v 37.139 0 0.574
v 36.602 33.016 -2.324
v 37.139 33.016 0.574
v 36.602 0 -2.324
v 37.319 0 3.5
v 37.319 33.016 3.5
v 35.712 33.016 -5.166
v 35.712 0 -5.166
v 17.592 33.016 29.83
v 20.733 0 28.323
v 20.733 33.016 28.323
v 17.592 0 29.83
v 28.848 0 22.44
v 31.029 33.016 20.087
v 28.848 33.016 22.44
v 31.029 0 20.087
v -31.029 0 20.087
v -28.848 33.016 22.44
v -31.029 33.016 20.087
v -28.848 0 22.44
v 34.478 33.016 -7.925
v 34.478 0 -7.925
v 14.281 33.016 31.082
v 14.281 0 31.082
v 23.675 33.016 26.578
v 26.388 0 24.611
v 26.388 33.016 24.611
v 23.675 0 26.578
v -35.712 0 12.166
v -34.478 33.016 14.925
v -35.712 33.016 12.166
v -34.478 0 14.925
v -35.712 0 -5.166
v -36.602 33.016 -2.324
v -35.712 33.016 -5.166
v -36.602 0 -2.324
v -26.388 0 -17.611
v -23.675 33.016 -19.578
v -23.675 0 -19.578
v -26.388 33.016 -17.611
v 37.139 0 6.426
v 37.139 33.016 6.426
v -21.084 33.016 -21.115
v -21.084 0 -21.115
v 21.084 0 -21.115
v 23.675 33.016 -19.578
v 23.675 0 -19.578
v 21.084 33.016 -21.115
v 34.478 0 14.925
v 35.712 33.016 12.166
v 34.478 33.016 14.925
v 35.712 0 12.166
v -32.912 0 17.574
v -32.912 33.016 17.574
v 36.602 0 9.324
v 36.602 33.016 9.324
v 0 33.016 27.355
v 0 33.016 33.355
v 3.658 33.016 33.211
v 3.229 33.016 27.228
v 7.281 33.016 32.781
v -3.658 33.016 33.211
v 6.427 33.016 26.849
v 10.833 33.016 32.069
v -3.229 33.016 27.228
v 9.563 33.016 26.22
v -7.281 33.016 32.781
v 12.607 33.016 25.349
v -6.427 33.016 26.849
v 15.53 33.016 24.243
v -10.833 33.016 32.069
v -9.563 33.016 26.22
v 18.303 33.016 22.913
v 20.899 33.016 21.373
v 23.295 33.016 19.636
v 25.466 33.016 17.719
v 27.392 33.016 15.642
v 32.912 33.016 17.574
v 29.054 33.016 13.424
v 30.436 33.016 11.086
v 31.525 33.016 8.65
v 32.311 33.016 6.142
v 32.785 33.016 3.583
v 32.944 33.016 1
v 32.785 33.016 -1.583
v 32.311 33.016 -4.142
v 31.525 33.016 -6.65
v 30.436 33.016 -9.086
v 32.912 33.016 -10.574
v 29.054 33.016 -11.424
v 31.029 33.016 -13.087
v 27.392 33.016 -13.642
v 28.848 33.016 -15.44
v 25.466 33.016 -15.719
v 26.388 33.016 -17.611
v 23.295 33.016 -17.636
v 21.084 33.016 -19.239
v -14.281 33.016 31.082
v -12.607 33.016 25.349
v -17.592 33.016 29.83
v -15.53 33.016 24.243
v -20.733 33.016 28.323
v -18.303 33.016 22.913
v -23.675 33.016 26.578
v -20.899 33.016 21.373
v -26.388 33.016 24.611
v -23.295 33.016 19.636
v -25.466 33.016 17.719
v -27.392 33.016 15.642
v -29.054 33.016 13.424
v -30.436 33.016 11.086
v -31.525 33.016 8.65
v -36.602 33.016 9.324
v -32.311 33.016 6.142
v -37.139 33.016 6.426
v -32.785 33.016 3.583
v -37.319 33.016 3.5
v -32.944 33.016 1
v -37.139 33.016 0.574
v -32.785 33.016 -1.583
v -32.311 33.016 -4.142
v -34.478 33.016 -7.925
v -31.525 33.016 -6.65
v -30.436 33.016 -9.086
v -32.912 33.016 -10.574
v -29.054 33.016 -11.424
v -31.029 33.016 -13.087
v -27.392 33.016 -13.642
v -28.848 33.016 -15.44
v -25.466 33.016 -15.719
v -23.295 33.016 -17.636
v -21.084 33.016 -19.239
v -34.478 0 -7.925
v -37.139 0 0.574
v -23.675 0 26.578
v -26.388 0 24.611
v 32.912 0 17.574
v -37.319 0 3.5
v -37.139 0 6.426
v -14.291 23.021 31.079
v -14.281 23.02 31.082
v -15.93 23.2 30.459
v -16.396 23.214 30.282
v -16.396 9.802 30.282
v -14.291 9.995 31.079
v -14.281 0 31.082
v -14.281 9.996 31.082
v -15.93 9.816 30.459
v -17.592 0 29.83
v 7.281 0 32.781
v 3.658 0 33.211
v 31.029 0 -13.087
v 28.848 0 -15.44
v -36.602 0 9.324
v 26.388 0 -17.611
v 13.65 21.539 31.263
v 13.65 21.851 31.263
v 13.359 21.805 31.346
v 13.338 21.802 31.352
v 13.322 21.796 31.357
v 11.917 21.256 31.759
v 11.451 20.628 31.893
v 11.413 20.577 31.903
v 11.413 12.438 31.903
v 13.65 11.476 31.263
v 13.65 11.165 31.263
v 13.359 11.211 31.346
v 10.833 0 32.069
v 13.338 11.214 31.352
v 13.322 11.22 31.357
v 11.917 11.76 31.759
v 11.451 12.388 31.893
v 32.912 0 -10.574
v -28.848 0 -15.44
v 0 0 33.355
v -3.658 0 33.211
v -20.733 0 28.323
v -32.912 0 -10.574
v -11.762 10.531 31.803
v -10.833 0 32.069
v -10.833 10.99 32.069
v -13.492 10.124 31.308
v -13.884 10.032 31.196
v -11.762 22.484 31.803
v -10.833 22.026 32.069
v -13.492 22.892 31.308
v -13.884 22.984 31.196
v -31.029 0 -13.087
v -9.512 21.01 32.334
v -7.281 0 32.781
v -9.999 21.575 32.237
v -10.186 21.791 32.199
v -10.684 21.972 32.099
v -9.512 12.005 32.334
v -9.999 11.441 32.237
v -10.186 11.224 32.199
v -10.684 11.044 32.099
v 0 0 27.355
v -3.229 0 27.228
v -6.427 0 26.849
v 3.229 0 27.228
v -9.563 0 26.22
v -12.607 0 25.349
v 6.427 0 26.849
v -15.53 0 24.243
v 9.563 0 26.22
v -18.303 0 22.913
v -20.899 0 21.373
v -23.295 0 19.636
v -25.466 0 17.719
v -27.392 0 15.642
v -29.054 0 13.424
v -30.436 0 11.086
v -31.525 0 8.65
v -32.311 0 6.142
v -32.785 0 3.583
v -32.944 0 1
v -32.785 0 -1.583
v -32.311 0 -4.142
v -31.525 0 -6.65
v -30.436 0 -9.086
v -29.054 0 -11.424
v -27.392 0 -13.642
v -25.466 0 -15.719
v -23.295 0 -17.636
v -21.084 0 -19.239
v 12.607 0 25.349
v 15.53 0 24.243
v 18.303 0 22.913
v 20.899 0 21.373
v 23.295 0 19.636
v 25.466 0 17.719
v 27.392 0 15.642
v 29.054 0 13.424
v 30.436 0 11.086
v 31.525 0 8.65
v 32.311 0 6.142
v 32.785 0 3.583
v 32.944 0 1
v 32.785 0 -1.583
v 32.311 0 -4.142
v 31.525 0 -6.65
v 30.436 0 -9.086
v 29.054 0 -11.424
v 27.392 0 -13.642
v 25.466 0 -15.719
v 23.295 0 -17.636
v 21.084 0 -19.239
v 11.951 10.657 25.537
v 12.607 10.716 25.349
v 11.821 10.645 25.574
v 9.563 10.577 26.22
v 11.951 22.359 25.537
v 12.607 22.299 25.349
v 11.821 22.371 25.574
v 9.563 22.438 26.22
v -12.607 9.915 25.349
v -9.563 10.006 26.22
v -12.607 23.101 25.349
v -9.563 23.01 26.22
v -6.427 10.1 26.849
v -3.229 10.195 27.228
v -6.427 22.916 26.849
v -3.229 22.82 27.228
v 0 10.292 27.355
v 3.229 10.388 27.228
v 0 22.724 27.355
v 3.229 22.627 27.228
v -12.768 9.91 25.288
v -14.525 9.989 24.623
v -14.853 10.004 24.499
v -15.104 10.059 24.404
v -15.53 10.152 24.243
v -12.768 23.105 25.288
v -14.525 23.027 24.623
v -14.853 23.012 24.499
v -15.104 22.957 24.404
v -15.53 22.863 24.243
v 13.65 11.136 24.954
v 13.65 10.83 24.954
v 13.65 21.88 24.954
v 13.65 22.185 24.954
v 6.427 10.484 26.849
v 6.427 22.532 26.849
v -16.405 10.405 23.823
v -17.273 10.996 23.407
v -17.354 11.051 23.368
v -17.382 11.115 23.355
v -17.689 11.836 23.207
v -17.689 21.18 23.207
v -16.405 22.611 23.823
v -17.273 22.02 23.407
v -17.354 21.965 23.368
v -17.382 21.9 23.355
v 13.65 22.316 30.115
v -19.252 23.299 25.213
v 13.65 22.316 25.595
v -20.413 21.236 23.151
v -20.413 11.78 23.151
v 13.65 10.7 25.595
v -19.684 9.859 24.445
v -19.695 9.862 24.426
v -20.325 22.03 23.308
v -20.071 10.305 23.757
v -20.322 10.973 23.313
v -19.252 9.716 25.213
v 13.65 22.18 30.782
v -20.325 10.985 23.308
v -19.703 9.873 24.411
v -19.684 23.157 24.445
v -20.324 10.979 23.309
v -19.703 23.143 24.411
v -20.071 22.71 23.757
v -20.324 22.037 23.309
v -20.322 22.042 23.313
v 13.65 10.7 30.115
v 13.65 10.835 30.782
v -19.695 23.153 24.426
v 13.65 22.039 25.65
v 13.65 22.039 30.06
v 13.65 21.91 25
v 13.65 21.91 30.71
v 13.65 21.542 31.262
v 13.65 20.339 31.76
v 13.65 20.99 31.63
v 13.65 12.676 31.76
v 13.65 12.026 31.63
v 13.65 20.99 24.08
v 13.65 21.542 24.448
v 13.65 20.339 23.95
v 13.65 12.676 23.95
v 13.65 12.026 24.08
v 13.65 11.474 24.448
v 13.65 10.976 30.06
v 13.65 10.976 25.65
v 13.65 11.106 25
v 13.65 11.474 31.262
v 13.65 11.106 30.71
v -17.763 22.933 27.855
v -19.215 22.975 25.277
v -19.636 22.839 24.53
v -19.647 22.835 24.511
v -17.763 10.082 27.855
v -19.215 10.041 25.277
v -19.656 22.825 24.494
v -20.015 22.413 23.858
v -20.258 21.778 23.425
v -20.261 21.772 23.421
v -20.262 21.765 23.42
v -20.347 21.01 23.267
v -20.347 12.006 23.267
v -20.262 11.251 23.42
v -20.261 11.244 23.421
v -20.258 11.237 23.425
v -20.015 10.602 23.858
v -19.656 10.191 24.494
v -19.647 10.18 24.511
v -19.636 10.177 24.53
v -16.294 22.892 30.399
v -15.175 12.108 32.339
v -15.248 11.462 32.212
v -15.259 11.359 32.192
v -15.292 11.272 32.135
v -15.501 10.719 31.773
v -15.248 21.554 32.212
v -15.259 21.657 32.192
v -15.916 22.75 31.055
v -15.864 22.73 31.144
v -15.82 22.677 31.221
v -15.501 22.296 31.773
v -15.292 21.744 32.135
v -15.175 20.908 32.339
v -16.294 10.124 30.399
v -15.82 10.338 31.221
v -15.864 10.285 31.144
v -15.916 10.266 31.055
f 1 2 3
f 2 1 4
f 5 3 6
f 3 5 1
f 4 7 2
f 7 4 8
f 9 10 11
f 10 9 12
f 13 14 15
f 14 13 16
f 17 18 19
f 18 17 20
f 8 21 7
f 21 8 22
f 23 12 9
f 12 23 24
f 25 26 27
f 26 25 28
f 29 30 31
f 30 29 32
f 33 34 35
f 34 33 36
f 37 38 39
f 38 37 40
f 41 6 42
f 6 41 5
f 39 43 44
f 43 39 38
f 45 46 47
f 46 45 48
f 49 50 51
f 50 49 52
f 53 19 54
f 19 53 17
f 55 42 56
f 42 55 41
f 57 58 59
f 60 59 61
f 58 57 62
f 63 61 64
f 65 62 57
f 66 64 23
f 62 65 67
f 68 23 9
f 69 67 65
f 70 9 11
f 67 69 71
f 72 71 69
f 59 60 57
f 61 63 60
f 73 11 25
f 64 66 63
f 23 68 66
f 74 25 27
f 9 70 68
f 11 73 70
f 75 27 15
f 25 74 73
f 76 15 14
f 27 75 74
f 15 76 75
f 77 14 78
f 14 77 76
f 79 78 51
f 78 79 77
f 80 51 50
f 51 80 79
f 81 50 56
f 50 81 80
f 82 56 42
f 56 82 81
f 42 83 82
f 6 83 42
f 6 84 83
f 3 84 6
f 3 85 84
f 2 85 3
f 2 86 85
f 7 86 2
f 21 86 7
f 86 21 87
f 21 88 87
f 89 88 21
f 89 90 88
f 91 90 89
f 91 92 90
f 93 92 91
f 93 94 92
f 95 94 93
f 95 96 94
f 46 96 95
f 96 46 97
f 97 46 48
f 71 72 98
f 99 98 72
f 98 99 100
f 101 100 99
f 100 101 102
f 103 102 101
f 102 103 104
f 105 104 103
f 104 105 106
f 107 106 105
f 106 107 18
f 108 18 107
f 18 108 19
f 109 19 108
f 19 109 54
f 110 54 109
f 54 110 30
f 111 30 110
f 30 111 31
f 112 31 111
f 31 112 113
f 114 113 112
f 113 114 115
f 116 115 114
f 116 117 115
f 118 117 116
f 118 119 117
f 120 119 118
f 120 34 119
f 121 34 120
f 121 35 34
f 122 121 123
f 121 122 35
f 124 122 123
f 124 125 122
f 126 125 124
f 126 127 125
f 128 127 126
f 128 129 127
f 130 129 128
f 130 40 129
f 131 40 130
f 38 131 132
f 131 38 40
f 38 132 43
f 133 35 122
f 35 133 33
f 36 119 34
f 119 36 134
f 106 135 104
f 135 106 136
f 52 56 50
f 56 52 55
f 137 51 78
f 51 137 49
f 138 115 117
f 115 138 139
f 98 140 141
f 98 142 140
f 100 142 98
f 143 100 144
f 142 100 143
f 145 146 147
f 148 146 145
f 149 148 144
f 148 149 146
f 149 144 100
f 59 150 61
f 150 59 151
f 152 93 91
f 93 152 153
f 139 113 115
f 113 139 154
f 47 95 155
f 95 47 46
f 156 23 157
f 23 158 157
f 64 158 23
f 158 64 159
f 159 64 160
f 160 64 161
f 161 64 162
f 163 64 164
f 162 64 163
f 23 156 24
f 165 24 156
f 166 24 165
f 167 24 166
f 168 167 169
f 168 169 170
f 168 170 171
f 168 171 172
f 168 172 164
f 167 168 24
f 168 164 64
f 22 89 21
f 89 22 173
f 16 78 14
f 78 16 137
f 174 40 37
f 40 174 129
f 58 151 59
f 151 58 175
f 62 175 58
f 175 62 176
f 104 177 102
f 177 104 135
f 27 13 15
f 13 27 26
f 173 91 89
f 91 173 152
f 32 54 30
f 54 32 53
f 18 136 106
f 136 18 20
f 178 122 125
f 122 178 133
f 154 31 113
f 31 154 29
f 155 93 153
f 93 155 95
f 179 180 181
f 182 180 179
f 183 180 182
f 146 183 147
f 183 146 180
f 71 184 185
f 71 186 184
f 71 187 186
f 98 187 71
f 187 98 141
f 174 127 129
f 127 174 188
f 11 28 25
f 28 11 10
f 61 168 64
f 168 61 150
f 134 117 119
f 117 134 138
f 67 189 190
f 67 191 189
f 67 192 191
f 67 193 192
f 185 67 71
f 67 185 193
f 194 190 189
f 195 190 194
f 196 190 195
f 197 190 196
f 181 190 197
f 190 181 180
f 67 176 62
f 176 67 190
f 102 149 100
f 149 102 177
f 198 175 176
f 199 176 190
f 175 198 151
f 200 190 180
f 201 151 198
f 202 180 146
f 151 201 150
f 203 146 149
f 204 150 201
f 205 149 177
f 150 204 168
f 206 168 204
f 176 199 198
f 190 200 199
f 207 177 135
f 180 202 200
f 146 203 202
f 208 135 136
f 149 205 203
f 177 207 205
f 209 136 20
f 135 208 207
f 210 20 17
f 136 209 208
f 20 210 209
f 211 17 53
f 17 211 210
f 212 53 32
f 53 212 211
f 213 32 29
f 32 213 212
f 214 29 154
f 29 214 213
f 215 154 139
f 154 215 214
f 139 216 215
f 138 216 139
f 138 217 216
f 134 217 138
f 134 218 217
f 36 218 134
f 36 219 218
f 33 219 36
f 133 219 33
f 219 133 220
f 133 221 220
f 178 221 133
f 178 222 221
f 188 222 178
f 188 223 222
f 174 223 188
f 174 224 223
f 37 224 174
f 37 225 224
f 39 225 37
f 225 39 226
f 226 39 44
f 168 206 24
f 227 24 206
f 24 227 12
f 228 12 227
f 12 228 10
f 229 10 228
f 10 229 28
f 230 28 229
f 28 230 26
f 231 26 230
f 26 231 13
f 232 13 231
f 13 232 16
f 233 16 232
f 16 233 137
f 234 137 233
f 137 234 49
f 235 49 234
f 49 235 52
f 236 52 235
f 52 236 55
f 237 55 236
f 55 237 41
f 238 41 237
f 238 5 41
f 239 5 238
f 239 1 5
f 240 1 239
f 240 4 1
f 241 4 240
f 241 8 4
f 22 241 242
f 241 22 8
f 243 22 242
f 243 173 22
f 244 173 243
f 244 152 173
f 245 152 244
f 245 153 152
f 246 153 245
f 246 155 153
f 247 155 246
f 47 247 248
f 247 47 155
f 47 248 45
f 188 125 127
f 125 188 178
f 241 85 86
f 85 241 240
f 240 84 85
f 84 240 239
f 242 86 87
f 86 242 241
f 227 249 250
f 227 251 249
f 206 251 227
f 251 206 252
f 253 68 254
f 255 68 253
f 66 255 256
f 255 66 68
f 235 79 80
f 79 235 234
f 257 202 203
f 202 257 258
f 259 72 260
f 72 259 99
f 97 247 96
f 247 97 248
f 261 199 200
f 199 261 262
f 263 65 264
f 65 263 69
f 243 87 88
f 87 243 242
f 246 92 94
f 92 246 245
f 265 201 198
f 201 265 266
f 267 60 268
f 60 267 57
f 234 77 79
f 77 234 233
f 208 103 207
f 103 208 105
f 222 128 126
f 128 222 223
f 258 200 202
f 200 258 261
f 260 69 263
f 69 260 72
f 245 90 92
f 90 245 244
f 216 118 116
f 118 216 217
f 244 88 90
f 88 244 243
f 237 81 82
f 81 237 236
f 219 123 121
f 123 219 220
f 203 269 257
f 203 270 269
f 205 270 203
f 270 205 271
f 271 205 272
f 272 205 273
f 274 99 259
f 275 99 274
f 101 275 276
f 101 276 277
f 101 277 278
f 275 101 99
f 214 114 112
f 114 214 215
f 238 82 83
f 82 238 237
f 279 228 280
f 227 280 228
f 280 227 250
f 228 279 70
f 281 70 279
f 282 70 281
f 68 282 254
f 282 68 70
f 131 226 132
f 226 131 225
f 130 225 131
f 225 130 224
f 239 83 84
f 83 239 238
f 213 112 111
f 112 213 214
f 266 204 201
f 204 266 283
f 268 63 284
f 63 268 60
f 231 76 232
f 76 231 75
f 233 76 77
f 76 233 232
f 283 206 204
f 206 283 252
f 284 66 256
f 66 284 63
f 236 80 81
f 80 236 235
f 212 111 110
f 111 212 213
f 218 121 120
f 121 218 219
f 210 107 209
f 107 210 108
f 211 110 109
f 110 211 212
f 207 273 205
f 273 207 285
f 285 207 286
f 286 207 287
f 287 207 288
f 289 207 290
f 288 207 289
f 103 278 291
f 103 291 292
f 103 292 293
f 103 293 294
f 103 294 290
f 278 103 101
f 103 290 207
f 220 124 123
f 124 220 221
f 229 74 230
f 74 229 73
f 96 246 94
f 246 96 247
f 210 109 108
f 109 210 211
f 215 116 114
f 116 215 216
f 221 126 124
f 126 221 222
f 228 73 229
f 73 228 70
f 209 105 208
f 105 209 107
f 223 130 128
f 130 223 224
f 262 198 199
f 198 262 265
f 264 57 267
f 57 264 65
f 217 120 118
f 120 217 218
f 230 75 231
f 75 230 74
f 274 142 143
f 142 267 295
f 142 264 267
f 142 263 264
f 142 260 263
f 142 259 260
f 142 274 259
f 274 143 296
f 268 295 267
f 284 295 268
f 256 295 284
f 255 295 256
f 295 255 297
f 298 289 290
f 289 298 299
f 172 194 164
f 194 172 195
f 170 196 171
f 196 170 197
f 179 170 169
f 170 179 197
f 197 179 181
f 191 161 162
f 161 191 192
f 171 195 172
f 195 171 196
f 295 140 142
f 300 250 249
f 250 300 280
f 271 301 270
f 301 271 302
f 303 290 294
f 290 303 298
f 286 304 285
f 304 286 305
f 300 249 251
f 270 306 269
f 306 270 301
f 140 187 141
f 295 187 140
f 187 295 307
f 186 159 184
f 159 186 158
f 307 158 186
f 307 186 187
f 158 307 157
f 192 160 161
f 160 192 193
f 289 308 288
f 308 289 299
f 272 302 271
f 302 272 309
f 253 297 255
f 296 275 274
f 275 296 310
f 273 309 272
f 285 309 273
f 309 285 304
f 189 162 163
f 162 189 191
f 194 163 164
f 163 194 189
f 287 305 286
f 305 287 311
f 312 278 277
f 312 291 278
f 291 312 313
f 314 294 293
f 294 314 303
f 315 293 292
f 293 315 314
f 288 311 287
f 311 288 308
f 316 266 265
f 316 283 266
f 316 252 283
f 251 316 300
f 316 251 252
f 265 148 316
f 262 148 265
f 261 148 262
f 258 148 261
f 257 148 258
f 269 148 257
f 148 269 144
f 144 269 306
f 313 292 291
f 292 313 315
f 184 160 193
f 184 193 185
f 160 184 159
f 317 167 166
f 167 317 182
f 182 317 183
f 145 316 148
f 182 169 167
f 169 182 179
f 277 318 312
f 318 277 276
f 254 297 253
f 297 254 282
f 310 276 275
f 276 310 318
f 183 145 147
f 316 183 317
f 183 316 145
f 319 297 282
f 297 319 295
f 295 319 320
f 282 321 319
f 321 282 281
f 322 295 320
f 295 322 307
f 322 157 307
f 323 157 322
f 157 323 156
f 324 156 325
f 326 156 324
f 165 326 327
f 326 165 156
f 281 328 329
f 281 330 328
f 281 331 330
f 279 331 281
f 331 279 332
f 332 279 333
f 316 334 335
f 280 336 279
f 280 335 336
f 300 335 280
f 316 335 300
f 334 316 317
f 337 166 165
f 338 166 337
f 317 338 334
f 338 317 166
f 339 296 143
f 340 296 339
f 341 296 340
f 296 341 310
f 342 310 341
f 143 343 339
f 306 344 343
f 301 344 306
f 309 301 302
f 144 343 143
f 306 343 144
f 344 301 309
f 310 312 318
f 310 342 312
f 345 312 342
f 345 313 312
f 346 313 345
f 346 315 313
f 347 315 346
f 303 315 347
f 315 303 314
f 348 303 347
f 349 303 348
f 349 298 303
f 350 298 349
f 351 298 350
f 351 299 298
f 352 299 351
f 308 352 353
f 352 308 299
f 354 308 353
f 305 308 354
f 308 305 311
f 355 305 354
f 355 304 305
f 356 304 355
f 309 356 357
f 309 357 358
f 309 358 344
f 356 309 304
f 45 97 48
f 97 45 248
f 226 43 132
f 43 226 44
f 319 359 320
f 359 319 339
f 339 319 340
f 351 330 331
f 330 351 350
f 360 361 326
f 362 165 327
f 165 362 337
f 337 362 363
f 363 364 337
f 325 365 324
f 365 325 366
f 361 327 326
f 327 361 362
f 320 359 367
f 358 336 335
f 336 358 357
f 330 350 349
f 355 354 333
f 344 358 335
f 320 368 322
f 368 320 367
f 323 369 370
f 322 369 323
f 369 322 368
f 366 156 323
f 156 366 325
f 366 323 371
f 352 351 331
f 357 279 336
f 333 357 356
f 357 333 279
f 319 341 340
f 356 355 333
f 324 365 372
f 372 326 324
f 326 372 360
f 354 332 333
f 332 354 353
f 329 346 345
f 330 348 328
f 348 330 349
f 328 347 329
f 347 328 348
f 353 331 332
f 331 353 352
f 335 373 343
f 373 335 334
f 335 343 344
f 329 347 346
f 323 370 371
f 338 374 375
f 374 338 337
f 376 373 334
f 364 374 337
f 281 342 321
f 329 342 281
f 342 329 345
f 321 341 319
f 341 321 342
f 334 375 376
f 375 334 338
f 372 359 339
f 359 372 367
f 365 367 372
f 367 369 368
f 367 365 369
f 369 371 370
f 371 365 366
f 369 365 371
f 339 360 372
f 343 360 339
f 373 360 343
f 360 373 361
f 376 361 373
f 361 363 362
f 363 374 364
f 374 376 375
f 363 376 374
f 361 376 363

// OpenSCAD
// Replacement band for Fitbit Flex.
//
// http://www.thingiverse.com/thing:205148
//
// (c) 2013,2014 Laird Popkin.

/* [Settings] */

// Measurement around wrist (mm).
wristLenMM = 185;
// and in inches
wristLenIn = 0;
// Part to view
part = 5; //[5: Preview, 4:Band]

// . 0:Assembled Flex (don't print), 1:Flex Band, 2:Flex Box Bottom, 3:Flex Box Top]

/* [Solid Band] */

// Ratio of wrist width to height. 1.0 = circular, 1.25 is normal.
stretch = 1.25;
// Fraction of wrist size to leave open. 1.0 is very loose, 0.8 is tight.
bandOpenRatio = 0.8;
// Band thickness (mm)
bandThick=7;
// Band 'wall' thickness (mm)
bandWall = 10;
// Generate support in model
support=0; //[0:Don't include support, 1:Include support]
// Flex adjust in/out. Positive moves towards the outside, negative moves to inside. Adjust if needed to have the Flex intersect the band as you like.
flexTweakR = 1.5;
// Flex adjust up/down. Positive moves towards the end with the lights, negative moves the other way.
flexTweakX = 0;
// Clearance around Fitbit in band, adjust for your printer. 0=none, .25=loose
clearance=.25;
clearanceFactor=clearance/10;

/* [Hidden] */

wristLength = wristLenMM + wristLenIn*24.5;
// Length of links
linkLen = 13; // [11:Tight, 12:Tight-ish, 13:Loose-ish, 14:Loose]

/* [Hidden] */
$fn=16;
linkHeight=7;
pi=3.14159; // I could go on...
wristLen = wristLength + linkHeight*3.14159; // diameter of outside of band to allow for thickness
in=24.5;
len = 1.4*in;
width=8.5/16*in;
height=3/8*in;
echo(len,width,height);
r=2;
xoff=width/2-r;
yoff=height/2-r;
thick=.5;

flexScale=1.3;
flexLScale=1.105;

blockH=10;
angle=30; // angle of face
zoff = sin(30)*5;

outerWidth=width+4.6*thick;
outerLen = len-3;
outerHeight = height+thick;

hinge_dia = outerHeight * 1000;

hingeXscale = .8;
hingeXoff=0.7;

echo("wrist band length ",wristLen);

flexAngle = 88.7; //89.2;

numLinks = floor((wristLen-outerLen-outerWidth/2)/(linkLen*2));
linksLen = numLinks*linkLen;
echo("links ",numLinks," length ",linksLen);

gap = 0.8;

echo("size ",outerWidth,outerLen,outerHeight);

module flex() {
	translate([0,0,-1]) difference() {
		translate([0,0,-zoff]) linear_extrude(scale=0.85,height=len) {
			square([width-2*r,height],center=true);
			square([width,height-2*r],center=true);

			translate([-xoff,-yoff,0]) circle(r=r);
			translate([-xoff,yoff,0]) circle(r=r);
			translate([xoff,-yoff,0]) circle(r=r);
			translate([xoff,yoff,0]) circle(r=r);
			}
		translate([0,0,-zoff]) rotate([30,0,0]) cube([2*width,2*height,5],center=true);
		}
	}

module male() {
	scale([1,1/2,1]) {
		translate([-outerWidth/8,0,0])
			cube([outerWidth/4,outerWidth/2,linkHeight]);
		translate([0,-gap,0]) cylinder(r=outerWidth/4, h=linkHeight);
		}
	}

module female() {
	scale([1,1/2,1]) difference() {
		translate([-outerWidth/2,-outerWidth/2-gap,0]) 
			cube([outerWidth,outerWidth,linkHeight]);
		translate([-outerWidth/8-gap,0,-1]) 
			cube([outerWidth/4+2*gap,outerWidth/2,linkHeight+2]);
		translate([0,0,-1]) cylinder(r=outerWidth/4+2*gap, h=linkHeight+2);
		}
	}

module FitBitBand(band=1) {
	//#translate([	outerWidth,0,0]) cube([1,wristLen,1],center=true);

	difference() {
		union() {
			// hull around Flex
			translate([0,len/2-zoff,height/2])
				rotate([flexAngle,0,0])
					scale([flexScale,flexScale,flexLScale]) flex();
			// Make 'head' thicker
			translate([0,outerLen*.43,height/2+thick/2]) cube([outerWidth,outerLen*.25,outerHeight],center=true); // around flex
			//block in middle of 'face'
			translate([0,-4,height/2+thick/2+outerHeight/4]) cube([outerWidth,outerLen*.2,outerHeight/2],center=true); // around flex
			//Make sides thicker
			translate([0,-4,height/2+thick/2])
				cube([outerWidth,outerLen,height-2*r],center=true); // around flex
			// links on both sides
			if (band) translate([0,0,outerHeight-linkHeight]) {
				for (link = [0:numLinks-1]) {
					assign (y=link*linkLen) {
//				for (y=[0:linkLen:wristLen/4+outerWidth/4]) {
					translate([hingeXoff,outerLen/2+y+linkLen/2,0]) scale([hingeXscale,1,1]) demo(linkHeight,gap/hingeXscale);
					translate([hingeXoff,-(outerLen/2+y+linkLen/2)-2,0]) scale([hingeXscale,1,1]) demo(linkHeight,gap/hingeXscale);
					}
				translate([0,-wristLen/2,0]) male();
				translate([0,wristLen/2,0]) female();
				}
				}
			}
		// carve out space for Flex
		translate([0,len/2-zoff-1,height/2]) rotate([flexAngle,0,0]) flex();
		// carve out hole on top to put Flex in
		translate([0,1,0]) cube([width,len-7,2*(r)],center=true);
		// carve out gap for pulling Flex out
		translate([0,len/2,.2]) cube([width*.75,6,2*(r+thick)], center=true);
		}

//	translate([hingeXoff,outerLen+1,0]) scale([hingeXscale,1,1]) demo(outerHeight,0.4/hingeXscale);
//	translate([hingeXoff,-outerLen-1,0]) scale([hingeXscale,1,1]) demo(outerHeight,0.4/hingeXscale);
//	translate([hingeXoff,1.75*outerLen+1,0]) scale([hingeXscale,1,1]) demo(outerHeight,0.4/hingeXscale);
//	translate([hingeXoff,-1.75*outerLen-1,0]) scale([hingeXscale,1,1]) demo(outerHeight,0.4/hingeXscale);
	//translate([hingeXoff,2.5*outerLen+1,0]) scale([hingeXscale,1,1]) demo(outerHeight,0.4/hingeXscale);
	//translate([hingeXoff,-2.5*outerLen-1,0]) scale([hingeXscale,1,1]) demo(outerHeight,0.4/hingeXscale);

	// fill gaps between ends and links
	if (band) translate([0,0,linkHeight*.9]) difference() {
		cube([outerWidth,wristLen-outerWidth/2,linkHeight],center=true);
		cube([outerWidth/.9,outerLen+2*linksLen,linkHeight+2],center=true);
		echo("gap len ",((wristLen-outerWidth/2) - (outerLen+2*linksLen))/2);
		}
	}

//flex();

module band() {
fitBitBand(0);
difference() {
	translate([0,0,outerHeight]) rotate([180,0,90]) FitBitBand();
	translate([0,0,-1]) cube([wristLen+10,outerWidth,2],center=true);
	if (part==0) rotate([90,0,0]) translate([0,0,4]) cube([wristLen+10,2*outerWidth,10],center=true);
	}
}

bandH = width+2*bandWall;

module solidBand(preview=0) {
	wristR = wristLen/pi/2/stretch;
	wristW = wristR+bandThick;
	echo ("wrist len ",wristLen," wrist R ",wristR);
	color("red") {
		difference() {
			scale([stretch,1,1]) difference() {
				translate([0,-bandThick/2,0]) 
					cylinder(r=wristR+bandThick/2, h=bandH, $fn=64);
				translate([0,-1,-1]) 
					cylinder(r=wristR, h=bandH+2, $fn=64);
				}
			difference() {
				translate([-len/2-flexTweakX,-wristR-flexTweakR,width/2+bandWall]) 
					rotate([0,-90,180]) 
						scale([1+2*clearanceFactor,
							1+clearanceFactor,
							1+0*clearanceFactor]) 
						flex();
				if (support) //for (xo=[-len/5:len/2.5:len/5]) {
					translate([0,-wristR-bandThick,0]) 
						cube([0.4,bandThick+2,width+2*r]); // loop
					//}
				}
			translate([-wristR*bandOpenRatio,0,-1]) 
				cube([2*wristR*bandOpenRatio, (wristR+bandThick),width+2*bandWall+2]);
			}
		}
		if (preview)
			translate([-len/2-flexTweakX,-wristR-flexTweakR,width/2+bandWall]) 
				rotate([0,-90,180])
					color("black") flex();

	}

module boxBottom() {
	margin = 3;
	bw = outerWidth + 2*margin;
	bl = wristLen+10 + 2*margin;
	wall = 1;

	difference() {
		translate([0,0,outerHeight/2-wall-margin]) cube([bl,bw,outerHeight],center=true);
		translate([0,0,outerHeight/2-margin]) cube([bl-2*wall,bw-2*wall,outerHeight-wall],center=true);
		if (part==0) rotate([90,0,0]) translate([0,0,9]) cube([wristLen+20,3*outerWidth,20],center=true);
		}
	}

module boxTop() {
	margin = 3;
	wall = 1;
	bw = outerWidth + 2*margin + 3*wall;
	bl = wristLen+10 + 2*margin + 3*wall;

	difference() {
		translate([0,0,outerHeight/2+wall+margin]) cube([bl,bw,outerHeight],center=true);
		translate([0,0,outerHeight/2+margin]) cube([bl-2*wall,bw-2*wall,outerHeight-wall],center=true);
		if (part==0) rotate([90,0,0]) translate([0,0,9]) cube([wristLen+20,3*outerWidth,20],center=true);
		}
	}

if ((part==0)||(part==1)) band();
if ((part==0)||(part==2)) boxBottom();
if ((part==0)||(part==3)) boxTop();
if (part==4) solidBand(0);
if (part==5) rotate([-90,0,0]) solidBand(1);

//male();
//female();

/// HINGE

// What diameter or thickness should the hinge have (in 0.01 mm units)?
//hinge_dia = 500; // [1:5000]

// How much gap should be left between separate parts (in 0.01 mm units)?
//hinge_gap = 40; // [1:2000]

module hingepair() {
	union() {
		cylinder(h=0.25, r=0.5);
		translate([0,0,0.25]) cylinder(h=0.25, r1=0.5, r2=0.25);
		translate([0,0,1]) cylinder(h=0.25, r1=0.25, r2=0.5);
		translate([0,0,1.25]) cylinder(h=0.25, r=0.5);
	}
}

module hingecore(gap) {
	union() {
		difference() {
			union() {
				cylinder(h=1.5, r=0.5);
				translate([-0.5,0,0.25+gap])
					cube(size=[1,1,1-gap-gap]);
				//translate([0,-0.5,0.25+gap])
				//	cube(size=[0.5,0.5,1-gap-gap]);
			}
			translate([0,0,0.25+gap-0.5]) cylinder(h=0.75, r1=1, r2=0.25);
			translate([0,0,1-gap]) cylinder(h=0.75, r1=0.25, r2=1);
		}
		translate([-0.5,0.5+gap,0])
			cube(size=[1,0.5-gap,1.5]);
	}
}

module hingeedge(gap) {
	union() {
		hingepair();
		translate([-0.5,-1,0])
			cube(size=[1,0.5-gap,1.5]);
		translate([-0.5,-1,0])
			cube(size=[1,1,0.25]);
		translate([-0.5,-1,1.25])
			cube(size=[1,1,0.25]);
		//translate([0,0,1.25])
		//	cube(size=[0.5,0.5,0.25]);
		//translate([0,0,0])
			//cube(size=[0.5,0.5,0.25]);
	}
}

module hinge(thick, realgap) {
	hingeedge(realgap / thick);
	hingecore(realgap / thick);
}

module demo(t, rg) { // modified to make only two hinges
	scale([t,t,t])
	translate([-2.75,0,0.5])
	rotate(a=[0,90,0])
	union() {
		//hinge(t, rg);
		translate([0,0,1.25]) hinge(t, rg);
		translate([0,0,2.5]) hinge(t, rg);
		//translate([0,0,3.75]) hinge(t, rg);
		//translate([-.5,1,1.25]) cube(size=[1,1,5.25/2+.1]);
		//translate([-0.5,-2,1.25]) cube(size=[1,1,5.25/2+.1]);
	}
}
